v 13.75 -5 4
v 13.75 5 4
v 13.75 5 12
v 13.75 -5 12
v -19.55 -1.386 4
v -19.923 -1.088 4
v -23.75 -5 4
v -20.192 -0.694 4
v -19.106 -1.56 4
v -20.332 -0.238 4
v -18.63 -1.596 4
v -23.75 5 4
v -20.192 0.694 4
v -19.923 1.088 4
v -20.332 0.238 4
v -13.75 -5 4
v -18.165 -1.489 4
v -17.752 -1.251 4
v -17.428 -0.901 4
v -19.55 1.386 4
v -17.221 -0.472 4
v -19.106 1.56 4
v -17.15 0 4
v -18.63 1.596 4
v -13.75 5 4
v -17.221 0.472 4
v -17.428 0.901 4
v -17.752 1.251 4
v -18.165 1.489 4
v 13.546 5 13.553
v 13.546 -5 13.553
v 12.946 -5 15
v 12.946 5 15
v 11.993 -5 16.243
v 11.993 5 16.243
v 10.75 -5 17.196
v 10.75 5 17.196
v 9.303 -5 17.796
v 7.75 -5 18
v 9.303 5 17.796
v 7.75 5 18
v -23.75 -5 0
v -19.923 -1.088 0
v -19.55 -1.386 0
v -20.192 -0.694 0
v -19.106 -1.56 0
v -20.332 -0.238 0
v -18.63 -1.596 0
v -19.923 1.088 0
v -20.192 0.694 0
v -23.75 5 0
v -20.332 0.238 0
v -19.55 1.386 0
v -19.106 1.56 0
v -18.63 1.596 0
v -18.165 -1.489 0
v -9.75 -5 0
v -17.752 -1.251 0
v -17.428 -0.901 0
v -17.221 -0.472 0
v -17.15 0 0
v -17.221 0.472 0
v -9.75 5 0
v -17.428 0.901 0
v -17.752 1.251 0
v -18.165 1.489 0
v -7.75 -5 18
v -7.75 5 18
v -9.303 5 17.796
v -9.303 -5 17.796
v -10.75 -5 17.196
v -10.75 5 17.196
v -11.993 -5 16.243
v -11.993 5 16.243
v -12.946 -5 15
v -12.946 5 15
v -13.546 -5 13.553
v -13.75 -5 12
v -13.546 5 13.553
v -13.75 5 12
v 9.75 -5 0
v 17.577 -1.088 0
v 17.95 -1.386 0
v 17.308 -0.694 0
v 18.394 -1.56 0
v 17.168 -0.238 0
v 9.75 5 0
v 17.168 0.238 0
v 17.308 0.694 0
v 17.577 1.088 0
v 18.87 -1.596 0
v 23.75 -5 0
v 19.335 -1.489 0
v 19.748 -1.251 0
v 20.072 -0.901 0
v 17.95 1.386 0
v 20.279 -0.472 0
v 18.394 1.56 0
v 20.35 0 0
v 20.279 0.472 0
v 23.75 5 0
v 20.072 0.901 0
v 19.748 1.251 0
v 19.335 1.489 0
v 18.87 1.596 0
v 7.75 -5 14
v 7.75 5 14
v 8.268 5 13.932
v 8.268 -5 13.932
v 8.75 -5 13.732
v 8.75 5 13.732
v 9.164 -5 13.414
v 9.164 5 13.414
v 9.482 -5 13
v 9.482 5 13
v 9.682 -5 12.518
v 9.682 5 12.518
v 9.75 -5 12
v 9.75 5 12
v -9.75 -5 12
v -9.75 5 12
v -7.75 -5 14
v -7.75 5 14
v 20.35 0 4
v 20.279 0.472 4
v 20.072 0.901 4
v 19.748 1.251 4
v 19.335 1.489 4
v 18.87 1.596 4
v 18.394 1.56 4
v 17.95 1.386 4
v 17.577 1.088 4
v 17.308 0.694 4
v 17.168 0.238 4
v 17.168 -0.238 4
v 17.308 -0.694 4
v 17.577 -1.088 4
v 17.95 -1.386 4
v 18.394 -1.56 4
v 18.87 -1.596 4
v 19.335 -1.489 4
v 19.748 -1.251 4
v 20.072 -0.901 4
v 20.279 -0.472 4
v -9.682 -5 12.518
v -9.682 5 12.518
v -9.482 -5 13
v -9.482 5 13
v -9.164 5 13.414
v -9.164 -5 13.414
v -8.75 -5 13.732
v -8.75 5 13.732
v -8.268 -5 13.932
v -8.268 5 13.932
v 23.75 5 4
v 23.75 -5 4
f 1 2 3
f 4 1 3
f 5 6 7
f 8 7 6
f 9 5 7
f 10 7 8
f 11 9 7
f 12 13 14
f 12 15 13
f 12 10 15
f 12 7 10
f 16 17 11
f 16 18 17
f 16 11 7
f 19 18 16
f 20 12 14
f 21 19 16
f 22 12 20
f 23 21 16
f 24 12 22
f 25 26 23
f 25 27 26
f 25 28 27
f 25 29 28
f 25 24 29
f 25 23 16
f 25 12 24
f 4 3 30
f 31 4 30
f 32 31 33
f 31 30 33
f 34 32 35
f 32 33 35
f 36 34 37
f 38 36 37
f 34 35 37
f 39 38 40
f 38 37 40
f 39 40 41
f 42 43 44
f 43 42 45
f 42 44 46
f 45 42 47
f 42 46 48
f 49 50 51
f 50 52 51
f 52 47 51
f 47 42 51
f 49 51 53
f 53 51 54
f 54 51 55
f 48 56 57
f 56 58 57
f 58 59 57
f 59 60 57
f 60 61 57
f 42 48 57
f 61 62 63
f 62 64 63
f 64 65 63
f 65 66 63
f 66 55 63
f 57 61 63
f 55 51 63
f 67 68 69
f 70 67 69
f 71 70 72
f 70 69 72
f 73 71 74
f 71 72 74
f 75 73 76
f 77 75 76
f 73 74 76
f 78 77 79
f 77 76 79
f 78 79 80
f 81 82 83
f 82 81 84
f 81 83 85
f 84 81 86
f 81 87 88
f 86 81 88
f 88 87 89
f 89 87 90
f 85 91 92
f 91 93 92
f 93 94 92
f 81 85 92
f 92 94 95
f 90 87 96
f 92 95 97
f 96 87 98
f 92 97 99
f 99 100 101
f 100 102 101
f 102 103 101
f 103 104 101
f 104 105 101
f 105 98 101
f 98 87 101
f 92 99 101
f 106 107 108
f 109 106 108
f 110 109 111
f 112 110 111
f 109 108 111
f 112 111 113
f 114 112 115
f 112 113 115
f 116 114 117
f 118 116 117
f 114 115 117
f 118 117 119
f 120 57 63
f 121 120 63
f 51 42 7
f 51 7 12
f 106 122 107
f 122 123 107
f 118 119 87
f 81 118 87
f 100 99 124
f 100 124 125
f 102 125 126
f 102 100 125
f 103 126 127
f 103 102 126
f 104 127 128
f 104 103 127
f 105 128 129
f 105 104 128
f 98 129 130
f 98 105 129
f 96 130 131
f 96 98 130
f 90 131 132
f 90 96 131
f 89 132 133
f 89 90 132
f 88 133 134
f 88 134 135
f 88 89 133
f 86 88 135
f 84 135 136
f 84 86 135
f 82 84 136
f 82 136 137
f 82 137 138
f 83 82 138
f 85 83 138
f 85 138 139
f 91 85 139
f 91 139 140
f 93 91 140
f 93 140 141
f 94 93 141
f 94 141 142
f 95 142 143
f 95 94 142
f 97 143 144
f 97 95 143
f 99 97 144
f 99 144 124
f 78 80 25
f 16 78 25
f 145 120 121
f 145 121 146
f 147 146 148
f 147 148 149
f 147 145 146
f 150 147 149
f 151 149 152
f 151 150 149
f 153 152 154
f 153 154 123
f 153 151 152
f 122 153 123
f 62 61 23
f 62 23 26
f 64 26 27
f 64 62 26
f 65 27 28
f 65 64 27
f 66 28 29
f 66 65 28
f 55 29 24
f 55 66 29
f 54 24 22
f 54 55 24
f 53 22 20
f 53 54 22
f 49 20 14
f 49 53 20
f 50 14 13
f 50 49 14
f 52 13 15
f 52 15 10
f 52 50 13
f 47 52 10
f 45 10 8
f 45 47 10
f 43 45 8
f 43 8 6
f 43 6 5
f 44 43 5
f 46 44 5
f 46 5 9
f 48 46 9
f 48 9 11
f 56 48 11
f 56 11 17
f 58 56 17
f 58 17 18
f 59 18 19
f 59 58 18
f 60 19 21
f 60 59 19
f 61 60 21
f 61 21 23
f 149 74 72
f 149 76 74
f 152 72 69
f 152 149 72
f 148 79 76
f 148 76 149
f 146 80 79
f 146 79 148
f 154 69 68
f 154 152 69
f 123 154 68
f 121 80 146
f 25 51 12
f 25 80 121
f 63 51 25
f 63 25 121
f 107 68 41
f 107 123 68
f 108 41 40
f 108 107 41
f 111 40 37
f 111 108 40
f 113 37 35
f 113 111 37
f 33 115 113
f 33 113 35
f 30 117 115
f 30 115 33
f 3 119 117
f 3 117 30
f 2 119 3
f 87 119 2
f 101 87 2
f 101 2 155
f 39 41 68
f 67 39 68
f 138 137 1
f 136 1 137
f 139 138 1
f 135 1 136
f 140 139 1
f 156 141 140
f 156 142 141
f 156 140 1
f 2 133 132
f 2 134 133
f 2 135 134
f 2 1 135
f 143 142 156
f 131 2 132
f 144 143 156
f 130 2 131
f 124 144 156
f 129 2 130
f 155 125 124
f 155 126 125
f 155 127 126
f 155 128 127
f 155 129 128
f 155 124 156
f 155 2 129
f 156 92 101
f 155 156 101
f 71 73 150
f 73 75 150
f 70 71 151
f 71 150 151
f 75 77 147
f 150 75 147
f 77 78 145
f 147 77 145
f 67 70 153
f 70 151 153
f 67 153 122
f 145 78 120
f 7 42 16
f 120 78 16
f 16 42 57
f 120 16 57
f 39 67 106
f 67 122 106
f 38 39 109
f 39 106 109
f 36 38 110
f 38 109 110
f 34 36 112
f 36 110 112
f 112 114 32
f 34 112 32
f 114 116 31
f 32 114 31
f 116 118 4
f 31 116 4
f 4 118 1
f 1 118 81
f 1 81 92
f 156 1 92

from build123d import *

# Parameters (mm, degrees)
F1_W          = 14
F1_H          = 10
F1_R          = 1.6
F2_DEPTH      = 4
F4_DEPTH      = 5
F4_DEPTH_BACK = 5


with BuildPart() as f2:
    # F1 (on Top) → F2 (new body)
    with BuildSketch(Plane.XY):
        with Locations((-16.75, 0)):
            Rectangle(F1_W, F1_H)
        with Locations((-18.75, 0)):
            Circle(F1_R, mode=Mode.SUBTRACT)
    extrude(amount=F2_DEPTH)



with BuildPart() as f2b:
    # F1 (on Top) → F2, piece 2 (new body)
    with BuildSketch(Plane.XY):
        with Locations((16.75, 0)):
            Rectangle(F1_W, F1_H)
        with Locations((18.75, 0)):
            Circle(F1_R, mode=Mode.SUBTRACT)
    extrude(amount=F2_DEPTH)


with BuildPart() as f2_1:
    add(f2.part)

    add(f2b.part)  # F4 merges F2b
    # F3 (on Front) → F4 (join, two sides)
    with BuildSketch(Plane.XZ) as f4_sk:
        with BuildLine():
            Line((-13.75, 0), (-9.75, 0))
            Line((-9.75, 0), (-9.75, 12))
            ThreePointArc((-9.75, 12), (-9.1642135624, 13.4142135624), (-7.75, 14))
            Line((-7.75, 14), (7.75, 14))
            ThreePointArc((7.75, 14), (9.1642135624, 13.4142135624), (9.75, 12))
            Line((9.75, 12), (9.75, 0))
            Line((9.75, 0), (13.75, 0))
            Line((13.75, 0), (13.75, 12))
            ThreePointArc((13.75, 12), (11.9926406871, 16.2426406871), (7.75, 18))
            Line((7.75, 18), (-7.75, 18))
            ThreePointArc((-7.75, 18), (-11.9926406871, 16.2426406871), (-13.75, 12))
            Line((-13.75, 12), (-13.75, 0))
        make_face()
    extrude(amount=F4_DEPTH)
    extrude(f4_sk.sketch, amount=-F4_DEPTH_BACK)


solid = f2_1.part
